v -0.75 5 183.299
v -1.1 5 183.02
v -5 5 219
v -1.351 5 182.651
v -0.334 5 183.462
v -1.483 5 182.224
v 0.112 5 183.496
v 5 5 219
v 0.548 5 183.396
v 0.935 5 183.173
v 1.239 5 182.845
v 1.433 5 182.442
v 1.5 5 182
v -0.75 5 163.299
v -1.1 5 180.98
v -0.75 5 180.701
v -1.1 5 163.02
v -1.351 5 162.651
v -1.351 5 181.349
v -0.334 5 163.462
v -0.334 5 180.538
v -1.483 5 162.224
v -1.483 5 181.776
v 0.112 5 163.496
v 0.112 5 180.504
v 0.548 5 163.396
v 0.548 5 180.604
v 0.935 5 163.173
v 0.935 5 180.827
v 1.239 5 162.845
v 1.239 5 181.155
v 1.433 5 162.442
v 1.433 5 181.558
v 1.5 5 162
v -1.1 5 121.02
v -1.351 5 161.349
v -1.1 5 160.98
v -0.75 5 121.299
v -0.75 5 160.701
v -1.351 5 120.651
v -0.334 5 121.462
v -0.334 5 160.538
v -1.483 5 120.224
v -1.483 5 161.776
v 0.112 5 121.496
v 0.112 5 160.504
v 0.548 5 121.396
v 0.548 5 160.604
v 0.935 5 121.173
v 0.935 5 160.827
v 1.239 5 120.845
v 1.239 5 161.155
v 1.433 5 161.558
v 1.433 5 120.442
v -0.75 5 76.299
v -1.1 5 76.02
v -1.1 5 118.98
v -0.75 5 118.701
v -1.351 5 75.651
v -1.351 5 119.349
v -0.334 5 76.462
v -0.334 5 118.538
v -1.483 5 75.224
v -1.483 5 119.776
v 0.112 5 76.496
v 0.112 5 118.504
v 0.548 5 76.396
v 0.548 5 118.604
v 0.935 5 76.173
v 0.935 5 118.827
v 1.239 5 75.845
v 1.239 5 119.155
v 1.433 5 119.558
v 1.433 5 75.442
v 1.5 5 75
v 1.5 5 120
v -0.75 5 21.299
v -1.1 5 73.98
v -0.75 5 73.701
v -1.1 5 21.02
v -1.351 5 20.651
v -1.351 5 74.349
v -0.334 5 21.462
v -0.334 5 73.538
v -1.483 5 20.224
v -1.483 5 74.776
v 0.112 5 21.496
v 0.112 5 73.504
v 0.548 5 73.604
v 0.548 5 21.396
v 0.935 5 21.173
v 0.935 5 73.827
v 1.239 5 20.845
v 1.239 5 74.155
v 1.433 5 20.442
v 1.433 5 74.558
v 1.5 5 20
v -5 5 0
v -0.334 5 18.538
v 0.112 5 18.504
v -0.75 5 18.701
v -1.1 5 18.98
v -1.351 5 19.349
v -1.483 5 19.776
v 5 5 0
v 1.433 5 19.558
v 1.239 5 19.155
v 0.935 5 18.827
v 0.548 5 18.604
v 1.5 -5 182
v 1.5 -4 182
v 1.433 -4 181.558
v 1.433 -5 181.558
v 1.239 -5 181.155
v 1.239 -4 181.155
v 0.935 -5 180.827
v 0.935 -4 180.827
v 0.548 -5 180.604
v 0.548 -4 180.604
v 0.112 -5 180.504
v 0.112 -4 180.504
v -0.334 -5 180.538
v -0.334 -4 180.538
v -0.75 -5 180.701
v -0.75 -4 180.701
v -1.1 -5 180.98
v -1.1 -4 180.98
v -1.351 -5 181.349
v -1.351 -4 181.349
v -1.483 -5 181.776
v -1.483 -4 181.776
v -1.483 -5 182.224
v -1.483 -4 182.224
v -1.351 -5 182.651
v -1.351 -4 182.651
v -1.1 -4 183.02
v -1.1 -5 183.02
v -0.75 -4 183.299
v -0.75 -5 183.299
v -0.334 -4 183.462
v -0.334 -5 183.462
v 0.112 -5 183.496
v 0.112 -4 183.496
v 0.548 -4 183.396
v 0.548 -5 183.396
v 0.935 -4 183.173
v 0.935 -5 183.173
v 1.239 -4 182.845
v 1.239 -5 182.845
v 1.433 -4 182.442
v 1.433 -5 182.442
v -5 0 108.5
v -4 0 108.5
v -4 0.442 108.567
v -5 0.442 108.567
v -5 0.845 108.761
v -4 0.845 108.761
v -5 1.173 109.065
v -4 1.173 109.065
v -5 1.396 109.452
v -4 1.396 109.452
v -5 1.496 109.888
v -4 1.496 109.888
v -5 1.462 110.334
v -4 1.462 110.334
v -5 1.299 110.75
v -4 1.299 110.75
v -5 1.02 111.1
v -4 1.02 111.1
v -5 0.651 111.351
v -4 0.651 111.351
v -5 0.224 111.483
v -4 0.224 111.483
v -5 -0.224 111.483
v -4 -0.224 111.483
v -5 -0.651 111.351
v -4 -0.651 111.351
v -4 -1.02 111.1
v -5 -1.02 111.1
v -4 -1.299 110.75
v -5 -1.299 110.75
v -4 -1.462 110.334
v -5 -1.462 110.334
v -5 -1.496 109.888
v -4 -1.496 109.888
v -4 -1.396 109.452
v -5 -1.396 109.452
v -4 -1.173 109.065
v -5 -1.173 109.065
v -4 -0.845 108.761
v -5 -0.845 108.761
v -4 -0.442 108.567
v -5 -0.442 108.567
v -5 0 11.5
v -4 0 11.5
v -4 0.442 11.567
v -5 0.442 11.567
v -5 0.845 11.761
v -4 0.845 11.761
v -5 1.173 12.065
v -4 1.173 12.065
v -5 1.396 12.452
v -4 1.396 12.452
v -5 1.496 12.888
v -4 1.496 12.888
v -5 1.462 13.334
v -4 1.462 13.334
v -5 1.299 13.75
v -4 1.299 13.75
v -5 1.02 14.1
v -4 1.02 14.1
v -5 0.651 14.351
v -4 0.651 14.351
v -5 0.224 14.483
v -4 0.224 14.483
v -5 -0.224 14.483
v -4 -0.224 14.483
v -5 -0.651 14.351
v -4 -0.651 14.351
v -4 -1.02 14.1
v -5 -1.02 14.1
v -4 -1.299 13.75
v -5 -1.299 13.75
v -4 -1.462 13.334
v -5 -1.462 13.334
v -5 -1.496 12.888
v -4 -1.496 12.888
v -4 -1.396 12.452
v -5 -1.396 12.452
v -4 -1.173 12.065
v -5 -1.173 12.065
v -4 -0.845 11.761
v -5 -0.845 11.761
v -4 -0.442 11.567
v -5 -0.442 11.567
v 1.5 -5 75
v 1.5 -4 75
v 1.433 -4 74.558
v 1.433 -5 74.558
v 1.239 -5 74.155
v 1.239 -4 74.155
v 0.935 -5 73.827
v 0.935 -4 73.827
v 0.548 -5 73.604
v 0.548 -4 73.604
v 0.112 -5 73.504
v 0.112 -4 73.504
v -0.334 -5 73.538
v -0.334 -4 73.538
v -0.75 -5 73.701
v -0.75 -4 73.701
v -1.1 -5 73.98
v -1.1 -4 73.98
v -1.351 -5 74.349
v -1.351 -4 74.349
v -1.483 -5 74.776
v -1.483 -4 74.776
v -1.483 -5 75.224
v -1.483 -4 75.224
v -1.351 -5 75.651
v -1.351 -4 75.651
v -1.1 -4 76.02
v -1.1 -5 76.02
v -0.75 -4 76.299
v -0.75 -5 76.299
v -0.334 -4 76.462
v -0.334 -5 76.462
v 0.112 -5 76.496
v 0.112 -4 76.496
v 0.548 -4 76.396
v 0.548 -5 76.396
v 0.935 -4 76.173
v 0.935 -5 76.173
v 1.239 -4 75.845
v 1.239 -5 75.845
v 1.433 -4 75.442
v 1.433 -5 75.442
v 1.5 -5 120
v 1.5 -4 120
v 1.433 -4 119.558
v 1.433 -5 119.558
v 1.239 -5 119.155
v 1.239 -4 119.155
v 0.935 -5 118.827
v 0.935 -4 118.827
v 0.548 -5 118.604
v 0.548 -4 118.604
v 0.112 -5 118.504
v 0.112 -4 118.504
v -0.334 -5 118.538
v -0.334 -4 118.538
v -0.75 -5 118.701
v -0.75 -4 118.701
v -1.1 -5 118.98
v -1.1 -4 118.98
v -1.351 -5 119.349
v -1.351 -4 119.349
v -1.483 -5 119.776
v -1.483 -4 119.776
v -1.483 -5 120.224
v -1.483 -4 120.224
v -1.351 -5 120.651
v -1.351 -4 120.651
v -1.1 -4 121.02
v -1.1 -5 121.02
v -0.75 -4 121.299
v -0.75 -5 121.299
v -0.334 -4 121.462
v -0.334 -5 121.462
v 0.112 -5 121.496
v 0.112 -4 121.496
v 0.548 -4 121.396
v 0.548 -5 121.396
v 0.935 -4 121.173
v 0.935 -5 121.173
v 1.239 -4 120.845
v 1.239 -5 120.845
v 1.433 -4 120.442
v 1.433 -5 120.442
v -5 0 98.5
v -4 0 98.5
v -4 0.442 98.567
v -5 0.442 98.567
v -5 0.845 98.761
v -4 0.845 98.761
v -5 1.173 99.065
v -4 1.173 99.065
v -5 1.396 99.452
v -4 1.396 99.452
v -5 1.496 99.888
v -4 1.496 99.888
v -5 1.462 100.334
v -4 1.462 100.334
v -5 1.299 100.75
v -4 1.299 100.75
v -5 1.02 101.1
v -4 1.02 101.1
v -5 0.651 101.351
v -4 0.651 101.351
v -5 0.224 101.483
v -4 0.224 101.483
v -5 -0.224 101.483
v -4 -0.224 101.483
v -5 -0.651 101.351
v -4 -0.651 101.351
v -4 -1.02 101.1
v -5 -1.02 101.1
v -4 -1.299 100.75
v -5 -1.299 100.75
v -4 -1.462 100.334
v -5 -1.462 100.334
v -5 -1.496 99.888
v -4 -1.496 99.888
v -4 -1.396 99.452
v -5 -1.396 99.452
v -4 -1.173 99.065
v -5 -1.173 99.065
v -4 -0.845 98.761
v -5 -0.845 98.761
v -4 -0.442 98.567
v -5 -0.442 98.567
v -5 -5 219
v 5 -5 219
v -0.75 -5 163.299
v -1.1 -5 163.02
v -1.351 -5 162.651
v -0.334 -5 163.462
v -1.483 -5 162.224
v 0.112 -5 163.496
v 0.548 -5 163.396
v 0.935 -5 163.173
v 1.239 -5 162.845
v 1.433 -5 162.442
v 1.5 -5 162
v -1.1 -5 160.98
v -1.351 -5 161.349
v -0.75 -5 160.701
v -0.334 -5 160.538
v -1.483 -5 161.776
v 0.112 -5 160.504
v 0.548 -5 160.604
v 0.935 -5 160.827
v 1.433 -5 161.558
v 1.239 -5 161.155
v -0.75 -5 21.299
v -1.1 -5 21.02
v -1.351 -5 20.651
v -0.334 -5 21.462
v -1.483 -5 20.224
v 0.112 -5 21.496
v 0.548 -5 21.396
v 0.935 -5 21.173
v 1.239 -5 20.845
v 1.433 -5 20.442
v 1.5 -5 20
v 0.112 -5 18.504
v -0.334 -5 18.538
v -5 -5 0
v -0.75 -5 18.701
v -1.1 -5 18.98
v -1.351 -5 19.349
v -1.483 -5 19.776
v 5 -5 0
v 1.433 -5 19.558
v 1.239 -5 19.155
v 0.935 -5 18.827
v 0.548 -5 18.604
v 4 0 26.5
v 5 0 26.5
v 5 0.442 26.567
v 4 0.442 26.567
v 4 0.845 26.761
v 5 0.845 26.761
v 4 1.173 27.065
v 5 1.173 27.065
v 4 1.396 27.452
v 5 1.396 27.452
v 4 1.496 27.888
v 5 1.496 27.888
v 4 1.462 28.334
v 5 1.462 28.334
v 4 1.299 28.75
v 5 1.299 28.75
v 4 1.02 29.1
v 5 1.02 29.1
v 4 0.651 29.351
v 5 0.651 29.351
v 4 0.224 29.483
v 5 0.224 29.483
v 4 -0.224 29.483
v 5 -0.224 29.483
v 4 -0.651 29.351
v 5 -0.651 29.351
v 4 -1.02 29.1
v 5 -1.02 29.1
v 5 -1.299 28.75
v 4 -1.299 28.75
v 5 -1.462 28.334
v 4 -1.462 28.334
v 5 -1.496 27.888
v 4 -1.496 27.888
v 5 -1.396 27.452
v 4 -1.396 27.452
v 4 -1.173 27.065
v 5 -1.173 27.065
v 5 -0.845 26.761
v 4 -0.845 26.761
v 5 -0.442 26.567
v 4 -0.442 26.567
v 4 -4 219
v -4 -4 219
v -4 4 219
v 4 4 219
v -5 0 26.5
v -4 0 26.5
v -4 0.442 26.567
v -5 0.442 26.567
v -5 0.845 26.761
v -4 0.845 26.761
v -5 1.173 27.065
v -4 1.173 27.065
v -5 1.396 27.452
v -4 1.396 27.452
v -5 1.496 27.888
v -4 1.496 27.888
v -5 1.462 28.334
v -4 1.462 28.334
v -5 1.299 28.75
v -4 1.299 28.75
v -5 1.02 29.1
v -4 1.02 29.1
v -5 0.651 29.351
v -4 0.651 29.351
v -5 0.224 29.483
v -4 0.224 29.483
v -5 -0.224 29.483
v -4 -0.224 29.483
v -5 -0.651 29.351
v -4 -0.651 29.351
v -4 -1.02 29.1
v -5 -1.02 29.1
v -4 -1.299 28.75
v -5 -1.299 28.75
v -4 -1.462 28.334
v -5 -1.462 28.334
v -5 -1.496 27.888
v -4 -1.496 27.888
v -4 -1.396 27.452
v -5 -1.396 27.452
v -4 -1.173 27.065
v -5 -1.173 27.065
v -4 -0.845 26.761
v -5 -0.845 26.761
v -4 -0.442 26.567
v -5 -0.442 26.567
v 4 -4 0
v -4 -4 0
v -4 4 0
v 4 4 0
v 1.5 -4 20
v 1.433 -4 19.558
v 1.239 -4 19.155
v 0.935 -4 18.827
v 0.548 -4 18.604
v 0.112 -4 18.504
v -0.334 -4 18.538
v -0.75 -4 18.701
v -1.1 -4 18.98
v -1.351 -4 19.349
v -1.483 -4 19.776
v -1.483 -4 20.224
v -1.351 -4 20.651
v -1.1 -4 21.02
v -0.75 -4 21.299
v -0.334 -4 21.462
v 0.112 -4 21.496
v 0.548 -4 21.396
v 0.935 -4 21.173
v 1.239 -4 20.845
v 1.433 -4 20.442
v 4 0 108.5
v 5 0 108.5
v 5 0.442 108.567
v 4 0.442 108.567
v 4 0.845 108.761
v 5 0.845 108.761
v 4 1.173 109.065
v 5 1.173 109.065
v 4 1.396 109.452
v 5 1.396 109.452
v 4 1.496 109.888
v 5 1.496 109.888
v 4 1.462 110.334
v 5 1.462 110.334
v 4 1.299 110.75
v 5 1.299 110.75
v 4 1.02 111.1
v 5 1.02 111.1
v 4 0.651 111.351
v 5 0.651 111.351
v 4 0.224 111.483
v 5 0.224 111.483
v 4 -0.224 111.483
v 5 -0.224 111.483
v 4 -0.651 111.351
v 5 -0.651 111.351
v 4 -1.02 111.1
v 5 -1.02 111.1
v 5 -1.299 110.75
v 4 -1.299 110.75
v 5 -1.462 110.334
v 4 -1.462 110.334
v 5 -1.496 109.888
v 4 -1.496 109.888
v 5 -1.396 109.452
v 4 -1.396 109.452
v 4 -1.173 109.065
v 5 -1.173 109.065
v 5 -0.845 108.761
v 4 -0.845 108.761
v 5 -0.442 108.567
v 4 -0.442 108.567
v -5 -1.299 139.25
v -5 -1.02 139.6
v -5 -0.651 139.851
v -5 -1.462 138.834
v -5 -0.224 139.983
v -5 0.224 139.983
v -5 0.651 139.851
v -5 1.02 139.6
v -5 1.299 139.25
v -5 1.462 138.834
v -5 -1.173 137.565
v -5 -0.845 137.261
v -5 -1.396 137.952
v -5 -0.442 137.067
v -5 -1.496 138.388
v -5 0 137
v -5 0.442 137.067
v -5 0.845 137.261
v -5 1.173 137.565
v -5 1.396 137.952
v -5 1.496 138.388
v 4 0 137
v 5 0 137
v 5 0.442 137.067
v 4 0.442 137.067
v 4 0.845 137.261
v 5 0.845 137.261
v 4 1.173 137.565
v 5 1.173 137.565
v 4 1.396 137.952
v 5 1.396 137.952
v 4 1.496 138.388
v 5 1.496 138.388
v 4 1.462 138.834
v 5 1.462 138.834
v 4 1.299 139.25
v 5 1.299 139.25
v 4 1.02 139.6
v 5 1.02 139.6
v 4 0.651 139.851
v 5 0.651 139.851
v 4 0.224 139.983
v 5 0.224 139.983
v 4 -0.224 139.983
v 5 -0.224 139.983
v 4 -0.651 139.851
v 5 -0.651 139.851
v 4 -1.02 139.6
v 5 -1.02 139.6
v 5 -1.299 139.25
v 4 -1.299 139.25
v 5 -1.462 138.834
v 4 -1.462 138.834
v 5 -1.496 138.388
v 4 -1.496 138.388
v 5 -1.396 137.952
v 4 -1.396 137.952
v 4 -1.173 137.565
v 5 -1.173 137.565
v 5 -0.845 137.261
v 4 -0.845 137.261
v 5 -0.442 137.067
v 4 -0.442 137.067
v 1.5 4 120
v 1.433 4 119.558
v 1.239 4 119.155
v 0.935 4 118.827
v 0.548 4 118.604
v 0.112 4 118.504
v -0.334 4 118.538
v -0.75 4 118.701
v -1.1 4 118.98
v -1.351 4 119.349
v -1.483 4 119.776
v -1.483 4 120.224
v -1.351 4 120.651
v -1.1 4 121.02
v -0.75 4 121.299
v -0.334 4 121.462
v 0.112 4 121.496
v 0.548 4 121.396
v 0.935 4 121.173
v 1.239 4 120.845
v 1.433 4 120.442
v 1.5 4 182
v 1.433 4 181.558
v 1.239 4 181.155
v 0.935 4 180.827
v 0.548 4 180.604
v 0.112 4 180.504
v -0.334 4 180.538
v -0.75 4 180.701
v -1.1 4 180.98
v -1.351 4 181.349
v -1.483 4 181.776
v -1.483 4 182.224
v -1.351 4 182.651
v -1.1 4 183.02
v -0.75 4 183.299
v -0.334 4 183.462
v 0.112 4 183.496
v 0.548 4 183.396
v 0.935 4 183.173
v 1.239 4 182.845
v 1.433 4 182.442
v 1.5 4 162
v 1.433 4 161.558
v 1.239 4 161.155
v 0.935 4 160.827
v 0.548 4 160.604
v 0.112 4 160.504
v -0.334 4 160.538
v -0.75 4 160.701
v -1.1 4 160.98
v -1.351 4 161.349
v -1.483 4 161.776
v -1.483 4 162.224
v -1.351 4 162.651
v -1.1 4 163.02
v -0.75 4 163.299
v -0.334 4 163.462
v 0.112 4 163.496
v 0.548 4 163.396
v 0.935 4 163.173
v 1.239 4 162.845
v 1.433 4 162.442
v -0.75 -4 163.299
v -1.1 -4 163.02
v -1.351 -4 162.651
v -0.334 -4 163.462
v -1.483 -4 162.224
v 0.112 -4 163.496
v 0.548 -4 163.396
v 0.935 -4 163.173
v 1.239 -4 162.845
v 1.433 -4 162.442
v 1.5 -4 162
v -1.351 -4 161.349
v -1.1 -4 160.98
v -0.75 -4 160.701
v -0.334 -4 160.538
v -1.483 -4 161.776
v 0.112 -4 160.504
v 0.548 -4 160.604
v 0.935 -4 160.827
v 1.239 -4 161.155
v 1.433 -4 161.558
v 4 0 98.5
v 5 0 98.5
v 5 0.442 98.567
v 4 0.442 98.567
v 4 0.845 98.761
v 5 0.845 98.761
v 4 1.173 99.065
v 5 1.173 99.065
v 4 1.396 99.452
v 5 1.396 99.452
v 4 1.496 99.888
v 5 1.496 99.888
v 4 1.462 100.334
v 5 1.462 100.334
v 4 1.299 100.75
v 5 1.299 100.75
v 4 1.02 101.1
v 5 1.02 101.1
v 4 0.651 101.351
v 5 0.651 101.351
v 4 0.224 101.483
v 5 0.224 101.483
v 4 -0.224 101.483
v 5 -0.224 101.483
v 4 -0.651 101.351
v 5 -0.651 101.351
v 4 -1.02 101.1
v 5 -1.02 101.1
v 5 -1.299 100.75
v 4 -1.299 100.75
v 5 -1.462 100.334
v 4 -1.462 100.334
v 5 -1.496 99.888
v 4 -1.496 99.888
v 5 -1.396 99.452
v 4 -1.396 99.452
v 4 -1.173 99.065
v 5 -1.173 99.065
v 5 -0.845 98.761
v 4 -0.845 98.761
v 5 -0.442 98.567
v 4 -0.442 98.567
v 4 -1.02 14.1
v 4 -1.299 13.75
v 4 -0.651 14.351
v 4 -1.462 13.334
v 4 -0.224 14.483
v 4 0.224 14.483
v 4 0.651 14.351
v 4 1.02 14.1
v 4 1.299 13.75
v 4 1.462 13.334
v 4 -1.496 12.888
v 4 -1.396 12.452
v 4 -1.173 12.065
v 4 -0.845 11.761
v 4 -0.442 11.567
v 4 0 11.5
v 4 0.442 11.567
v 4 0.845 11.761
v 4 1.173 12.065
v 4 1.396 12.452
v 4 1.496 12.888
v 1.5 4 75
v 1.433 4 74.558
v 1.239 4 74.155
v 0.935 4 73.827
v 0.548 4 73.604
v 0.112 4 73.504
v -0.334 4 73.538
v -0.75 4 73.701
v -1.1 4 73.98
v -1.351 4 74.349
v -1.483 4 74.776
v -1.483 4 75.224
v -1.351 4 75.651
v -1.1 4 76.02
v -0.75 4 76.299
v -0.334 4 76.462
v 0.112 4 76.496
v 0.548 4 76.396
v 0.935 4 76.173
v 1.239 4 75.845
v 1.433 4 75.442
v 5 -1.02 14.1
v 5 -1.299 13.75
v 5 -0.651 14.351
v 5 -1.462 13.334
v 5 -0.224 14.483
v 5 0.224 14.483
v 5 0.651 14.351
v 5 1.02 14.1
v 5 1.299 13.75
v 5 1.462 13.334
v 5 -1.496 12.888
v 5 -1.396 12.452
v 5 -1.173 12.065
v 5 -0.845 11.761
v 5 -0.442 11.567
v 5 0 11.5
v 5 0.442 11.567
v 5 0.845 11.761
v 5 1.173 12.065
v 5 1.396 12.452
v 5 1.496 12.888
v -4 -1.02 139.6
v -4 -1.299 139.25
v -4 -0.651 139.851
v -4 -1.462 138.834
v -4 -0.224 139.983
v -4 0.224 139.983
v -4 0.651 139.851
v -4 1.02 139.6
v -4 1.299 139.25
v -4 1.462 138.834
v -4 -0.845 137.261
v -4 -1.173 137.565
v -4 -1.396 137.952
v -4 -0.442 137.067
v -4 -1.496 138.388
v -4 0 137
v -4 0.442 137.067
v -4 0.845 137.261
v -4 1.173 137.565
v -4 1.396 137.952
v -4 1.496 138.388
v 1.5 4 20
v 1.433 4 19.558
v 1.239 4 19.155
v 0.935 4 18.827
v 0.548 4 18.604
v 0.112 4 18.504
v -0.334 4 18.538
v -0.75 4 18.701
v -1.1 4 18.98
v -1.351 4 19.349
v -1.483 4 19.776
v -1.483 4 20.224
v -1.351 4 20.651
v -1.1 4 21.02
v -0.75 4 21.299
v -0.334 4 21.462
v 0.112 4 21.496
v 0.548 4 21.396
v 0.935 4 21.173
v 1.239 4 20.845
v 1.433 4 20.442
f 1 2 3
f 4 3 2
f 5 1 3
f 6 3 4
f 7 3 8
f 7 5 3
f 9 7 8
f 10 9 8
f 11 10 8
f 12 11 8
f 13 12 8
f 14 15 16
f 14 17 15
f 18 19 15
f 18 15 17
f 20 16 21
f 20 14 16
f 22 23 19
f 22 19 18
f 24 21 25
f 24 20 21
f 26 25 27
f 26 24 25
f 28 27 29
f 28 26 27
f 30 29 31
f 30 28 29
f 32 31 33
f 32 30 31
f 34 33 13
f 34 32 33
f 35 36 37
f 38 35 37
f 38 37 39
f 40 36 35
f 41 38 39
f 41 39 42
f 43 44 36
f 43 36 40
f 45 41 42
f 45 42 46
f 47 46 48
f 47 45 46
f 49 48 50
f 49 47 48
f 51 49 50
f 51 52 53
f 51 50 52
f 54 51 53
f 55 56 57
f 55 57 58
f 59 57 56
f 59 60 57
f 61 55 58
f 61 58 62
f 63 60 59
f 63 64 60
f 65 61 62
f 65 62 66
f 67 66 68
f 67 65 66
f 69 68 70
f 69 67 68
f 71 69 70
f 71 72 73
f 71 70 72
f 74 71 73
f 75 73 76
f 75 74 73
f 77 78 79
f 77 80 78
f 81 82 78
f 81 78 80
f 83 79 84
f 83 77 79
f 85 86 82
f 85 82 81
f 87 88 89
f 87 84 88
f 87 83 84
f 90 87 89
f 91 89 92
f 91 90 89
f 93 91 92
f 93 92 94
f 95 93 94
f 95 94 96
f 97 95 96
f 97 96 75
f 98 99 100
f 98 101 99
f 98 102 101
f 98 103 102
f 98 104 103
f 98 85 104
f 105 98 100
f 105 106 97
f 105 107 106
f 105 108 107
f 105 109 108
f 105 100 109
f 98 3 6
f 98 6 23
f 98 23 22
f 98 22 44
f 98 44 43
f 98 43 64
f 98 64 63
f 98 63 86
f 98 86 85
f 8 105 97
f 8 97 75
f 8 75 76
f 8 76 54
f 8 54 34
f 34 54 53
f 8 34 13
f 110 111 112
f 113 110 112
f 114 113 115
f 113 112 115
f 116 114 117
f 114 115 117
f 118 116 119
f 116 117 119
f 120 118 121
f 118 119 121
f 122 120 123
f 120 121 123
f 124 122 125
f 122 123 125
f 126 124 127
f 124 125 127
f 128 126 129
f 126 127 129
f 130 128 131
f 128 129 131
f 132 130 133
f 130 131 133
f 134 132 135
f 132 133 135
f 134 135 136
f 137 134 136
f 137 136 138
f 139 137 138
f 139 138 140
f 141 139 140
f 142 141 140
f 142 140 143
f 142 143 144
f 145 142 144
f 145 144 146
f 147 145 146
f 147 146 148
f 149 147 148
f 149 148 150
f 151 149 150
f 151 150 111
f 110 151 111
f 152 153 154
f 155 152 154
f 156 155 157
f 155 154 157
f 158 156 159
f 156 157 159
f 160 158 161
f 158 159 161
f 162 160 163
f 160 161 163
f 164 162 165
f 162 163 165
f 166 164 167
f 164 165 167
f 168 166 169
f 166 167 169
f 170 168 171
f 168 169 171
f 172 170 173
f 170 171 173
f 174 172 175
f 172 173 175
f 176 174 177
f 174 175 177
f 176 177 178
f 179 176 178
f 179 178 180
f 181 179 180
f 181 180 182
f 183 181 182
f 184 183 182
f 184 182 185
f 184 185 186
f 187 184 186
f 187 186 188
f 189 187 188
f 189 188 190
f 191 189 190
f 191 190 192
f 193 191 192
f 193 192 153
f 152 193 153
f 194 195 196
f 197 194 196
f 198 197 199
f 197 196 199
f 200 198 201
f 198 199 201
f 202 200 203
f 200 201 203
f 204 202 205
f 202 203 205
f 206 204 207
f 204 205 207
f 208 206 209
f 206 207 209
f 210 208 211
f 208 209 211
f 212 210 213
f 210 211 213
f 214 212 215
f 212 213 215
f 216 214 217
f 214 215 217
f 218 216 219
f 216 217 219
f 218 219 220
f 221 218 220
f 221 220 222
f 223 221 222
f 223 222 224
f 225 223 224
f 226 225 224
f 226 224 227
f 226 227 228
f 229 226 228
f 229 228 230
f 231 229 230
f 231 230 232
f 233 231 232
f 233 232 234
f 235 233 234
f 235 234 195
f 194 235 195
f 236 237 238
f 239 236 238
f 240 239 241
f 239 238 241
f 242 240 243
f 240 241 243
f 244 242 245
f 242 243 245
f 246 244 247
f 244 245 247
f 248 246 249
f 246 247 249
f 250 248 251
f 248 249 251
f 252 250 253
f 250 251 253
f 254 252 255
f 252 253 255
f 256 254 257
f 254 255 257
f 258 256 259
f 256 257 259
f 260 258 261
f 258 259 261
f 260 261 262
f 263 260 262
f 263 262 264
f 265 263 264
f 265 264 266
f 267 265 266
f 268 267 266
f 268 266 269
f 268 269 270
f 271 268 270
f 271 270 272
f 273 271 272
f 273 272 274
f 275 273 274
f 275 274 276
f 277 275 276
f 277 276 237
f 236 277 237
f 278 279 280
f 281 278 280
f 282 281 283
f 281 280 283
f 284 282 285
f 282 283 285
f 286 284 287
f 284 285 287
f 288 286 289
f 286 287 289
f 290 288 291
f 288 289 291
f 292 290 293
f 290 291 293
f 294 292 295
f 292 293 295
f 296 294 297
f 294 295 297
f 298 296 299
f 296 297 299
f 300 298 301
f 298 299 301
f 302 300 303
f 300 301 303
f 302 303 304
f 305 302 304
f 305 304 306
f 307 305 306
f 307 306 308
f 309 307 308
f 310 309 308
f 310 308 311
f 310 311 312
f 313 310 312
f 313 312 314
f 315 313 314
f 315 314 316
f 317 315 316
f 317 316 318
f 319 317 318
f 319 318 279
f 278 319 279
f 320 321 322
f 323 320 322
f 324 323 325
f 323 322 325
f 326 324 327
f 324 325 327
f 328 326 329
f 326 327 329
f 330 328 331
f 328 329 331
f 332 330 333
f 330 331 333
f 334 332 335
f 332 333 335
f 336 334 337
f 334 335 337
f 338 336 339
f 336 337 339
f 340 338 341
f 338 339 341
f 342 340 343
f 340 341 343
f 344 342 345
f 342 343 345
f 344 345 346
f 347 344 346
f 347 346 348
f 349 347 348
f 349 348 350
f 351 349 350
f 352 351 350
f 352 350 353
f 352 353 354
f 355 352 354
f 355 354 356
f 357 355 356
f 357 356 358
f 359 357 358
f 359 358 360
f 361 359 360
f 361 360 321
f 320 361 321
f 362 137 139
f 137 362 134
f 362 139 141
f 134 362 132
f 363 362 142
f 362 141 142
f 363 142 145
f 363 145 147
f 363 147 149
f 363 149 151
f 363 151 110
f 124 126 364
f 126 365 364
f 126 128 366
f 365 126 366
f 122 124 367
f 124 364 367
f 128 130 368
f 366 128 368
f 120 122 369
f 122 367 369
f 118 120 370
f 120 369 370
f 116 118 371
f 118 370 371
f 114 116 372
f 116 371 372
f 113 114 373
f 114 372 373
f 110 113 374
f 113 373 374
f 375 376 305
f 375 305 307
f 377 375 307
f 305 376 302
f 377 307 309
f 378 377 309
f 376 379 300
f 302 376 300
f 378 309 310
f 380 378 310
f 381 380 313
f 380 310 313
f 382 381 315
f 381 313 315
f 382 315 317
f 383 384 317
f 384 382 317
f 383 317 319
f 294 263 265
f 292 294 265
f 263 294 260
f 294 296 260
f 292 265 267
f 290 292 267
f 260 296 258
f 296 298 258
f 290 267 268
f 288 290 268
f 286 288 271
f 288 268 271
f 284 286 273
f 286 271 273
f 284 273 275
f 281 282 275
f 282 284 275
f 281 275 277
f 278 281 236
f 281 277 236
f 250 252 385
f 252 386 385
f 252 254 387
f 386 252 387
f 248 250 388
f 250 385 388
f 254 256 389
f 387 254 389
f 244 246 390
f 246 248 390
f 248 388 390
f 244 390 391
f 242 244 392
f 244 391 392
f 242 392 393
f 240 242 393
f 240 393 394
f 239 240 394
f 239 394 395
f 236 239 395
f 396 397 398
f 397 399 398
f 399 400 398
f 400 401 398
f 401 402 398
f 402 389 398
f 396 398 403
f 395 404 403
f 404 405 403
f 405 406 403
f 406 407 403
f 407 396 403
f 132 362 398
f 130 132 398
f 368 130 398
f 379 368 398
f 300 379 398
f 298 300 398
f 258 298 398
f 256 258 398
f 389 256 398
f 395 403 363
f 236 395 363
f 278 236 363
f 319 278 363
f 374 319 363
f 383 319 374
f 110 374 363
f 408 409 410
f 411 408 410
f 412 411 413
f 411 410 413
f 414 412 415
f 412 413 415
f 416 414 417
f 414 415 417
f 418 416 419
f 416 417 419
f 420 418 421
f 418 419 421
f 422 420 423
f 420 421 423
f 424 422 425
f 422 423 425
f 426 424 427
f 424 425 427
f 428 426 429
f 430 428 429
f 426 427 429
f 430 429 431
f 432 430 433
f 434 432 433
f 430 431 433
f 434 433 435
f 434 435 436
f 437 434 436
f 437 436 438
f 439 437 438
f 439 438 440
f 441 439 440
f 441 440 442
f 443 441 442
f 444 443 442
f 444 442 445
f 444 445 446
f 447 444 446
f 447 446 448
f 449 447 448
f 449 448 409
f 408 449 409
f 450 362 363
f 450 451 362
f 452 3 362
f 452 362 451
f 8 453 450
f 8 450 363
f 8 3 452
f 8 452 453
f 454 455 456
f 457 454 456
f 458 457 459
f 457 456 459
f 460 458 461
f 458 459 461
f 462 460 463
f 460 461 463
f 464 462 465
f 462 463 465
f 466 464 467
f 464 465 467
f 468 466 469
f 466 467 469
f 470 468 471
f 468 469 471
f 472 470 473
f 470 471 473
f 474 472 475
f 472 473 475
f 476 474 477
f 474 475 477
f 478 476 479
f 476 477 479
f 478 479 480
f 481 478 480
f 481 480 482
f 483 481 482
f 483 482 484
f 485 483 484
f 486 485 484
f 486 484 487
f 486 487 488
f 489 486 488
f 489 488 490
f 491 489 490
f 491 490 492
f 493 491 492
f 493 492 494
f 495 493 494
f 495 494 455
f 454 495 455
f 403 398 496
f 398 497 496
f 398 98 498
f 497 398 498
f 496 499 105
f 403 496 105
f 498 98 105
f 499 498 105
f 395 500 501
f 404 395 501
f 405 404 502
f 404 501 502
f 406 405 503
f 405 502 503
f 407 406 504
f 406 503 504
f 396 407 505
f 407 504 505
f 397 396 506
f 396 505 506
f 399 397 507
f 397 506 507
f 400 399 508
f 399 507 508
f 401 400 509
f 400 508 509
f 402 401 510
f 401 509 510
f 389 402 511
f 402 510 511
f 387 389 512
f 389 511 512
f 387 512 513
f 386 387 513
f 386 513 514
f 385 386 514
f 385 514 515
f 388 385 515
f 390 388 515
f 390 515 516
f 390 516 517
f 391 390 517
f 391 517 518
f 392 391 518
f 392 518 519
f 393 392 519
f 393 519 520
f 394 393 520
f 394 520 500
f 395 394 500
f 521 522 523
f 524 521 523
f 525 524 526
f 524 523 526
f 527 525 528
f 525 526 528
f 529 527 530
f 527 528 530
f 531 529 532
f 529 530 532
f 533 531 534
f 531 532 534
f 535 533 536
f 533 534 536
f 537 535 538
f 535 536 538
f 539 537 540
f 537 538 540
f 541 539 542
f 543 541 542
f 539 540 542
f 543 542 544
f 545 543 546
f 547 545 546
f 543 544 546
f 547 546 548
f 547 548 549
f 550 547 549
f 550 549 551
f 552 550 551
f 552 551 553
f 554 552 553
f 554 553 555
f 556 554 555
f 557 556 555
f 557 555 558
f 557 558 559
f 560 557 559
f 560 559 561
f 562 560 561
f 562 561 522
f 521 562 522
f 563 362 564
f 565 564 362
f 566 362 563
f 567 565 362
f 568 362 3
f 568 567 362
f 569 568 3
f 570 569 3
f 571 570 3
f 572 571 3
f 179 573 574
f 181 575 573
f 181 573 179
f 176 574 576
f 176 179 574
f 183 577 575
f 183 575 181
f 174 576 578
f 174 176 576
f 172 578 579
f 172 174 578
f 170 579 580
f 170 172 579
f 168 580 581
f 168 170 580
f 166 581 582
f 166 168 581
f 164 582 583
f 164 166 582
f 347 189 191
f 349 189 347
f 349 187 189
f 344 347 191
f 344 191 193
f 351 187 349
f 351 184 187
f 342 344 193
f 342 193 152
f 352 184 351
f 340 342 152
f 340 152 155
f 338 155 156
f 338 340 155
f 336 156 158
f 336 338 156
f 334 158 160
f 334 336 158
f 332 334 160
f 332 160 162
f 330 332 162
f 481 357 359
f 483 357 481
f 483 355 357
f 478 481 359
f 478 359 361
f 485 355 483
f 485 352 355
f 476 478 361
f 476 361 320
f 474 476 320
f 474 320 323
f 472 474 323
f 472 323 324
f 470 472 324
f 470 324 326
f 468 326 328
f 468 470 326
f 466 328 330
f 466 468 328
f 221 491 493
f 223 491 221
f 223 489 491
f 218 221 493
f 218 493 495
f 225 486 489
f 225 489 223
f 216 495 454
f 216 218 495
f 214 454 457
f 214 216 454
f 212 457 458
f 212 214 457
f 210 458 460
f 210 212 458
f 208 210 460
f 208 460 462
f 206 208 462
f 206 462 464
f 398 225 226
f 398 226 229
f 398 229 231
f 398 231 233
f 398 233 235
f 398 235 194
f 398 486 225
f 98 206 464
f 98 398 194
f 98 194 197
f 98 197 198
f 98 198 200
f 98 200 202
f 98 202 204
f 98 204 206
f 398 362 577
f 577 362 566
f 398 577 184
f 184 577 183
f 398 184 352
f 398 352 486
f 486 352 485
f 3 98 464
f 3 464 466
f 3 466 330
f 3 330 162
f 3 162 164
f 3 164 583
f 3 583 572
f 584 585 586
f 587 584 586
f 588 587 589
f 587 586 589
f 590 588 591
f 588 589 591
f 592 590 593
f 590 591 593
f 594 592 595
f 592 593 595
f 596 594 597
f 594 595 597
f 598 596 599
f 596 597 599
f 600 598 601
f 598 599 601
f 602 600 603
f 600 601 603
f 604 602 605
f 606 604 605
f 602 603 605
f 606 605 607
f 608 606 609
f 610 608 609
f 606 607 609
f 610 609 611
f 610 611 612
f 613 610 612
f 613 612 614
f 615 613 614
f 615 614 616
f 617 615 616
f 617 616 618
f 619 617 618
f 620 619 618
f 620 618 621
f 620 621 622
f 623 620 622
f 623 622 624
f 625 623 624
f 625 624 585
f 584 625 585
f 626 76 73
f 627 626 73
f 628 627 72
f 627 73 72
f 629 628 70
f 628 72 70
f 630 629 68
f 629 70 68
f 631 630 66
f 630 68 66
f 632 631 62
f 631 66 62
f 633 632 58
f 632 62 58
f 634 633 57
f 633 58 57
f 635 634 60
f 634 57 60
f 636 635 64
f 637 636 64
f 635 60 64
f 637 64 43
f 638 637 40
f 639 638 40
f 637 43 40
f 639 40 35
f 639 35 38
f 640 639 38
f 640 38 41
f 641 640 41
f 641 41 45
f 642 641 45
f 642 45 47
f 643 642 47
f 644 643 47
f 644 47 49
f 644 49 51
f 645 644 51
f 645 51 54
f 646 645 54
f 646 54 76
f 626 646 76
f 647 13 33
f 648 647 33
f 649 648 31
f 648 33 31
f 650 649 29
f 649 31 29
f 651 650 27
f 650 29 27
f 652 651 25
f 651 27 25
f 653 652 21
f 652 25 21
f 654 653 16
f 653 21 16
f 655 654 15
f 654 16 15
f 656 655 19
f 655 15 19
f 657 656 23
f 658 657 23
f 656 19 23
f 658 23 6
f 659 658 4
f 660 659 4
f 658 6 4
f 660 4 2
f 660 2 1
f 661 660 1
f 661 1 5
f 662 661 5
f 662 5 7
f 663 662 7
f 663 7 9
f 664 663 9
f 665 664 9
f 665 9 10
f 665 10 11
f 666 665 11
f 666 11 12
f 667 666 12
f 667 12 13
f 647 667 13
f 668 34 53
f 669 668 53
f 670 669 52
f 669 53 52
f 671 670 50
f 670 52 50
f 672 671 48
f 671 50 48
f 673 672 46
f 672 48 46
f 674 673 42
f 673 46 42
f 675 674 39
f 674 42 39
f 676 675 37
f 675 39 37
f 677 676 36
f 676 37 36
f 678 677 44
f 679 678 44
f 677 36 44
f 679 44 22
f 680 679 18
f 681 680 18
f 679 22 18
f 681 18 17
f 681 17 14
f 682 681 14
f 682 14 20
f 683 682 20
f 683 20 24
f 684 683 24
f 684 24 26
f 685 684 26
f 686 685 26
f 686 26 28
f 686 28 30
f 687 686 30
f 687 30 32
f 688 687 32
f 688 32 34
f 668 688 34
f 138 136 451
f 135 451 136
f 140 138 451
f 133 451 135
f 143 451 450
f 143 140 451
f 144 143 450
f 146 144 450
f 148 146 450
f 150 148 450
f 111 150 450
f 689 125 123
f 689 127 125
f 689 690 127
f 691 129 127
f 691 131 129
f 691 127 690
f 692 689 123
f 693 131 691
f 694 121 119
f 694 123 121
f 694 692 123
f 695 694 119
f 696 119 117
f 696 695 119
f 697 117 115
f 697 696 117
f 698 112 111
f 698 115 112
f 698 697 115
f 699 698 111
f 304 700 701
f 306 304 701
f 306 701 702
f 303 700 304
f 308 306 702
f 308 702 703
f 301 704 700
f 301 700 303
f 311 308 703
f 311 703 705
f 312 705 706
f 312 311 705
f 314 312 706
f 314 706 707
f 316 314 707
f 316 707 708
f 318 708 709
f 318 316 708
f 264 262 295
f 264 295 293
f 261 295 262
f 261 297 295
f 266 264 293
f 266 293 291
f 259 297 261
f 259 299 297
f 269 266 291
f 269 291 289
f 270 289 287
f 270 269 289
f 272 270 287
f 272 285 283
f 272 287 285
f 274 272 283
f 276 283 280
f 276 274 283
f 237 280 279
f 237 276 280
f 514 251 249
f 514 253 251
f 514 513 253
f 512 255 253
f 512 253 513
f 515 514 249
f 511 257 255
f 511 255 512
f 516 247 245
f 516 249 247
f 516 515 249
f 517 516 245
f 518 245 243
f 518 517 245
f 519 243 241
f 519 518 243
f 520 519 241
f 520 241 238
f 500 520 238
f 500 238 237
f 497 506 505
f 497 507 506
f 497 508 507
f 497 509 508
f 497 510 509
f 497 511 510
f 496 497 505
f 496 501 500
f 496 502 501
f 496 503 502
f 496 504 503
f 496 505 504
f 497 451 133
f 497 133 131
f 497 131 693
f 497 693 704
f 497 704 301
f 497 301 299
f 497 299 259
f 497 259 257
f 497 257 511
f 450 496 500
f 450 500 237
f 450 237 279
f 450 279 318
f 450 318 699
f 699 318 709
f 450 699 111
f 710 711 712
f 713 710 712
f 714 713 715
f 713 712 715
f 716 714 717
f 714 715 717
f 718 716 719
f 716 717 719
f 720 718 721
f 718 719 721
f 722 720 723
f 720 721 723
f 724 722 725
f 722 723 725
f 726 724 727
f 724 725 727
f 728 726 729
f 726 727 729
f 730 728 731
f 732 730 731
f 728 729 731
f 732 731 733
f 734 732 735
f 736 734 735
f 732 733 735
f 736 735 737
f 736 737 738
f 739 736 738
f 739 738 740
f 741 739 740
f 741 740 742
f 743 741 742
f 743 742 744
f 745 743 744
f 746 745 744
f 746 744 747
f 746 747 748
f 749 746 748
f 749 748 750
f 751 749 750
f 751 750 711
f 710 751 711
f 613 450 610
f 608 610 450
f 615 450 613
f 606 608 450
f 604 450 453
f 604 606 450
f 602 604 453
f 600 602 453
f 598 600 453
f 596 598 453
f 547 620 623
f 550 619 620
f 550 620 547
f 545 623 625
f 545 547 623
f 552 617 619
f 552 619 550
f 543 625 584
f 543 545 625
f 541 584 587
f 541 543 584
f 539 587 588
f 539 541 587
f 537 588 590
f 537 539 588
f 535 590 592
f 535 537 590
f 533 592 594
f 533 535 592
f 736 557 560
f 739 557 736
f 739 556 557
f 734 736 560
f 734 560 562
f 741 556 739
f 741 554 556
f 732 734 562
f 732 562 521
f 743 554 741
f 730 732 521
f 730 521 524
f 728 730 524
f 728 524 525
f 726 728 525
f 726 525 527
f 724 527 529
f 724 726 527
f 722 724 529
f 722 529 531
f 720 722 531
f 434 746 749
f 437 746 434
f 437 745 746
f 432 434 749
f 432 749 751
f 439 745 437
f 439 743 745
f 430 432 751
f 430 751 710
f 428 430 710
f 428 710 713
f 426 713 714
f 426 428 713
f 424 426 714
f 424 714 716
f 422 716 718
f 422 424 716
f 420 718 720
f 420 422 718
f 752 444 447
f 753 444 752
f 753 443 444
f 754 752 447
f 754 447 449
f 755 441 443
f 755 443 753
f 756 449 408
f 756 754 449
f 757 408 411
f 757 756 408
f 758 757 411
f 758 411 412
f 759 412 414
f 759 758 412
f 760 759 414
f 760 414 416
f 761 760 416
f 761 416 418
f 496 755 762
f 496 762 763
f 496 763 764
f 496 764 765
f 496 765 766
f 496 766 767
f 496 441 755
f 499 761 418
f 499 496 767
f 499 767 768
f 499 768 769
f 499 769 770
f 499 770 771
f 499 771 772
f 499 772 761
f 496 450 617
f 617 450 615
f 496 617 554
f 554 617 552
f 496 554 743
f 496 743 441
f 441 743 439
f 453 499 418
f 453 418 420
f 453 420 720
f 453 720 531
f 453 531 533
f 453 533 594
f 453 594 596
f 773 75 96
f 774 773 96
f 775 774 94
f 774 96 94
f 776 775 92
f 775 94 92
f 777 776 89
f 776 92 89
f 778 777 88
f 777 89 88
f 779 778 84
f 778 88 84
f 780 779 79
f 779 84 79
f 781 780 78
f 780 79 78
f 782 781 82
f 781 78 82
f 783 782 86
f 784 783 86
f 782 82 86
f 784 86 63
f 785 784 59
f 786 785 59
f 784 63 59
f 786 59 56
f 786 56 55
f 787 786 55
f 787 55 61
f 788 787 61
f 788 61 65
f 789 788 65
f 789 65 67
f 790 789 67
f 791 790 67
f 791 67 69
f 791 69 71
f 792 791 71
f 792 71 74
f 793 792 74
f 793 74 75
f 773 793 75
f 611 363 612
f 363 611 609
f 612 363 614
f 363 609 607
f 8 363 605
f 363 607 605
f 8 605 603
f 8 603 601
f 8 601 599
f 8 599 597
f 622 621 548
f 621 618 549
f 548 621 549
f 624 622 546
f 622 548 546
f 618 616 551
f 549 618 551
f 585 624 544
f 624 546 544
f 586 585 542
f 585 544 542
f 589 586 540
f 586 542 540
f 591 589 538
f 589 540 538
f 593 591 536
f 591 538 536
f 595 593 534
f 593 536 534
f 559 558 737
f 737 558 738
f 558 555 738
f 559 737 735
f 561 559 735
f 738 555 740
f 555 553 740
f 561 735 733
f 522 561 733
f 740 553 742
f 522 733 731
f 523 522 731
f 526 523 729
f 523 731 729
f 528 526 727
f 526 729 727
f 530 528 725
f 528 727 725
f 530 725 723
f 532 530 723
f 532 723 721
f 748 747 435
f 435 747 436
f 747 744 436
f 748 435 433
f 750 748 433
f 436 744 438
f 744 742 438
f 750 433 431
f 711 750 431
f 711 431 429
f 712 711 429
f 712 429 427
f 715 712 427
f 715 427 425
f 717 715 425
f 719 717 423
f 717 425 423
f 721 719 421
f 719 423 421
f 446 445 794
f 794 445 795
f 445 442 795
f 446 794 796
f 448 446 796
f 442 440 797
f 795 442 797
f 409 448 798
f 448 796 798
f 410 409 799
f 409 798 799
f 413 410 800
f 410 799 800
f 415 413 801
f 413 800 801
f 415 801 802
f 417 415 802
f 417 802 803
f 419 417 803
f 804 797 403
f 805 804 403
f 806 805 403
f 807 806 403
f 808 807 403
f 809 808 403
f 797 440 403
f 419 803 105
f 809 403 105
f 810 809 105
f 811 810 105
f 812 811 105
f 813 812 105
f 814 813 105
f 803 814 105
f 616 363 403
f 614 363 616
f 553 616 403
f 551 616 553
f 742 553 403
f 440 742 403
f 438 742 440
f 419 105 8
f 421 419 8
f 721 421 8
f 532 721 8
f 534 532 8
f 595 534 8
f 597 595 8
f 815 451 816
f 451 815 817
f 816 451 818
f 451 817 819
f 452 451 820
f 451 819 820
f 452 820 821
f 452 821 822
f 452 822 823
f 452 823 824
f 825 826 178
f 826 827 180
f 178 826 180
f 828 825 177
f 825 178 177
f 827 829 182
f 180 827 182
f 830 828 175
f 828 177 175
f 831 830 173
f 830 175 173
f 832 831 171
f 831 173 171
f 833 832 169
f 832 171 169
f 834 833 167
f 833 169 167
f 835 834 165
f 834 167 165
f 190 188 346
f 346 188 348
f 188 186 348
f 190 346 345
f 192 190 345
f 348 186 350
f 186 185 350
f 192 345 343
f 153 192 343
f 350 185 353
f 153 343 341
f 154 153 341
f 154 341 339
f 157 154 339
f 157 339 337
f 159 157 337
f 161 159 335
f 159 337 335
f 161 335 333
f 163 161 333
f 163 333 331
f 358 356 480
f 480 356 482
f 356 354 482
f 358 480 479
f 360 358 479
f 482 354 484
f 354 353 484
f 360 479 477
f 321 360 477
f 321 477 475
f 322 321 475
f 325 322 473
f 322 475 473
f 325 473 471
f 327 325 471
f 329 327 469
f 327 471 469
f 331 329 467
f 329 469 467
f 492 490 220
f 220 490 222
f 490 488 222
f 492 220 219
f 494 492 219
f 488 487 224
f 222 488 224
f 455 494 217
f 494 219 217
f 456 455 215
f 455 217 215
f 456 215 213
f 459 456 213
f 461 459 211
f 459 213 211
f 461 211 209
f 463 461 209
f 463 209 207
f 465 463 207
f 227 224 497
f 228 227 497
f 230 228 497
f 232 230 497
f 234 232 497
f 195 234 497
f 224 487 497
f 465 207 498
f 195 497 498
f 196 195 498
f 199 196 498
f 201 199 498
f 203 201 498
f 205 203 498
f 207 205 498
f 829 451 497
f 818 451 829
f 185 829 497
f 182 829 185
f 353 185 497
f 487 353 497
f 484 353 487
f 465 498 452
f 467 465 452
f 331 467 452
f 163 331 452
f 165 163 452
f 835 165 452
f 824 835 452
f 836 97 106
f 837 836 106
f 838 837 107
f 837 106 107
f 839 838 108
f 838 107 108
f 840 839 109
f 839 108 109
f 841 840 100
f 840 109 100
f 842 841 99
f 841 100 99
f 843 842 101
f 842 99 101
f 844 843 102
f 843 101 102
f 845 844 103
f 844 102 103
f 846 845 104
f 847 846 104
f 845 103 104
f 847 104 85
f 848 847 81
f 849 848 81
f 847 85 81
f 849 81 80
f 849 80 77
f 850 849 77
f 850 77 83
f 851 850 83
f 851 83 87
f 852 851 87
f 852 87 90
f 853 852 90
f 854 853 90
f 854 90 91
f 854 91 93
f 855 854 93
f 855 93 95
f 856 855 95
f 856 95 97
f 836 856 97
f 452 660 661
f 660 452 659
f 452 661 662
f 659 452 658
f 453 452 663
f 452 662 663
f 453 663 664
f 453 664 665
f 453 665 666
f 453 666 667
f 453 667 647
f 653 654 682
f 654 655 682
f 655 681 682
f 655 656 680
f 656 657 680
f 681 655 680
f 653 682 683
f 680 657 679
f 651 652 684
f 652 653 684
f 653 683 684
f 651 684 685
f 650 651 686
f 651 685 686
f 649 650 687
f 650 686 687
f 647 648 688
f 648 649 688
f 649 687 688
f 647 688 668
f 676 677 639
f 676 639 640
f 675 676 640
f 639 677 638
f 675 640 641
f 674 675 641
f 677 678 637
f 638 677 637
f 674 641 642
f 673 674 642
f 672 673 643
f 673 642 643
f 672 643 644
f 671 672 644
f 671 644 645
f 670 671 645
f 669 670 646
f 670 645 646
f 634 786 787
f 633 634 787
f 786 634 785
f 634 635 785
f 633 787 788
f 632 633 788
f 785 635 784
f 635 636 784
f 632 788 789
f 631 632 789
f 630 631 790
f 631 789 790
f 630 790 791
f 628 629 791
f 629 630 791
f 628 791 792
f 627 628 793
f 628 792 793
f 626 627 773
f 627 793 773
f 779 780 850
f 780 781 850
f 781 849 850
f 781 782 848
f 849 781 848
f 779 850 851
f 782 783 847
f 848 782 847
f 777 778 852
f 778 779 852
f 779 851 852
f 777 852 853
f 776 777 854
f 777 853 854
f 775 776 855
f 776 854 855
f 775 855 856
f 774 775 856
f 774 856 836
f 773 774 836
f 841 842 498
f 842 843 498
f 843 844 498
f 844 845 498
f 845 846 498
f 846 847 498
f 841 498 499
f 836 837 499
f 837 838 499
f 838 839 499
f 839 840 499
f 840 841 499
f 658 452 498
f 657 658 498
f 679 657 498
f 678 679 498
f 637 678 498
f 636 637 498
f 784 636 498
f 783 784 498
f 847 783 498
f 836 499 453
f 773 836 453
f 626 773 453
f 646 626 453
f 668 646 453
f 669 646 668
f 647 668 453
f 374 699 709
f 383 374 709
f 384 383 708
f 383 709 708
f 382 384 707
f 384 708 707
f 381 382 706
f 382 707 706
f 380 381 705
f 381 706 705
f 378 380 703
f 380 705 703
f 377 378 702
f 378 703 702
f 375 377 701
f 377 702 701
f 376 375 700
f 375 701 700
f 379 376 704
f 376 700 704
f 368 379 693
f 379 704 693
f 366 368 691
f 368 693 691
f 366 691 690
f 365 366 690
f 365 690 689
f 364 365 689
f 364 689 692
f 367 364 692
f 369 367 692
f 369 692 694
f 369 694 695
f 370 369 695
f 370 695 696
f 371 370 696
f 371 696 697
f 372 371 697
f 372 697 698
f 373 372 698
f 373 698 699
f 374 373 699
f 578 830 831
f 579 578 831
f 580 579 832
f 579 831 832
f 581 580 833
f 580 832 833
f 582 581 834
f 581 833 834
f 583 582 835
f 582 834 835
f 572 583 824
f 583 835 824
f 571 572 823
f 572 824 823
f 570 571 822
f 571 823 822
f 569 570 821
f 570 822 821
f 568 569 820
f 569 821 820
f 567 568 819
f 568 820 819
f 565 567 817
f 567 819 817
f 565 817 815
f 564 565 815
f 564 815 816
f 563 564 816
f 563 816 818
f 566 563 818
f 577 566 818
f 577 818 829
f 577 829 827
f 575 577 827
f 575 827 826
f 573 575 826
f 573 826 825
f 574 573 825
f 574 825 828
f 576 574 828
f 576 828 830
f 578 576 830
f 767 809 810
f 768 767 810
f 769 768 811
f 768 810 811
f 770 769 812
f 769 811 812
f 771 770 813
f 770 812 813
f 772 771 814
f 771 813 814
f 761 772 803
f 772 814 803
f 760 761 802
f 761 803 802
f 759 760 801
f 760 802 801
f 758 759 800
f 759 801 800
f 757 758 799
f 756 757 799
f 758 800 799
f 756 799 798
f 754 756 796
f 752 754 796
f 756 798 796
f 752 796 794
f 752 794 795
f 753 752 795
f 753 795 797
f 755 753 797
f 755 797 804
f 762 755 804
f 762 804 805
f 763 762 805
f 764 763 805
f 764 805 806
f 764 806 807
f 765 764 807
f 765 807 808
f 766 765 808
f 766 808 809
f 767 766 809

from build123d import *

# Parameters (mm, degrees)
SKETCH_1_W          = 10
SKETCH_1_H          = 10
SKETCH_1_W_2        = 8
SKETCH_1_H_2        = 8
EXTRUDE_1_DEPTH     = 219
SKETCH_2_R          = 1.5
CUT_EXTRUDE_1_DEPTH = 10
SKETCH_3_R          = 1.5
CUT_EXTRUDE_2_DEPTH = 11


with BuildPart() as part:
    # 草图1 → 拉伸-薄壁1 (new body)
    with BuildSketch(Plane.XY):
        Rectangle(SKETCH_1_W, SKETCH_1_H)
        Rectangle(SKETCH_1_W_2, SKETCH_1_H_2, mode=Mode.SUBTRACT)
    extrude(amount=EXTRUDE_1_DEPTH)

    # 草图2 → 切除-拉伸1 (cut)
    with BuildSketch(Plane(origin=(0, 5, 0), x_dir=(1, 0, 0), z_dir=(0, 1, 0))):
        with Locations((0, -182)):
            Circle(SKETCH_2_R)
        with Locations((0, -20)):
            Circle(SKETCH_2_R)
        with Locations((0, -120)):
            Circle(SKETCH_2_R)
        with Locations((0, -162)):
            Circle(SKETCH_2_R)
        with Locations((0, -75)):
            Circle(SKETCH_2_R)
    extrude(amount=-CUT_EXTRUDE_1_DEPTH, mode=Mode.SUBTRACT)

    # 草图3 → 切除-拉伸2 (cut, through all)
    with BuildSketch(Plane(origin=(5, 0, 0), x_dir=(0, 0, -1), z_dir=(1, 0, 0))):
        with Locations((-13, 0)):
            Circle(SKETCH_3_R)
        with Locations((-28, 0)):
            Circle(SKETCH_3_R)
        with Locations((-138.5, 0)):
            Circle(SKETCH_3_R)
        with Locations((-100, 0)):
            Circle(SKETCH_3_R)
        with Locations((-110, 0)):
            Circle(SKETCH_3_R)
    extrude(amount=-CUT_EXTRUDE_2_DEPTH, mode=Mode.SUBTRACT)


solid = part.part
